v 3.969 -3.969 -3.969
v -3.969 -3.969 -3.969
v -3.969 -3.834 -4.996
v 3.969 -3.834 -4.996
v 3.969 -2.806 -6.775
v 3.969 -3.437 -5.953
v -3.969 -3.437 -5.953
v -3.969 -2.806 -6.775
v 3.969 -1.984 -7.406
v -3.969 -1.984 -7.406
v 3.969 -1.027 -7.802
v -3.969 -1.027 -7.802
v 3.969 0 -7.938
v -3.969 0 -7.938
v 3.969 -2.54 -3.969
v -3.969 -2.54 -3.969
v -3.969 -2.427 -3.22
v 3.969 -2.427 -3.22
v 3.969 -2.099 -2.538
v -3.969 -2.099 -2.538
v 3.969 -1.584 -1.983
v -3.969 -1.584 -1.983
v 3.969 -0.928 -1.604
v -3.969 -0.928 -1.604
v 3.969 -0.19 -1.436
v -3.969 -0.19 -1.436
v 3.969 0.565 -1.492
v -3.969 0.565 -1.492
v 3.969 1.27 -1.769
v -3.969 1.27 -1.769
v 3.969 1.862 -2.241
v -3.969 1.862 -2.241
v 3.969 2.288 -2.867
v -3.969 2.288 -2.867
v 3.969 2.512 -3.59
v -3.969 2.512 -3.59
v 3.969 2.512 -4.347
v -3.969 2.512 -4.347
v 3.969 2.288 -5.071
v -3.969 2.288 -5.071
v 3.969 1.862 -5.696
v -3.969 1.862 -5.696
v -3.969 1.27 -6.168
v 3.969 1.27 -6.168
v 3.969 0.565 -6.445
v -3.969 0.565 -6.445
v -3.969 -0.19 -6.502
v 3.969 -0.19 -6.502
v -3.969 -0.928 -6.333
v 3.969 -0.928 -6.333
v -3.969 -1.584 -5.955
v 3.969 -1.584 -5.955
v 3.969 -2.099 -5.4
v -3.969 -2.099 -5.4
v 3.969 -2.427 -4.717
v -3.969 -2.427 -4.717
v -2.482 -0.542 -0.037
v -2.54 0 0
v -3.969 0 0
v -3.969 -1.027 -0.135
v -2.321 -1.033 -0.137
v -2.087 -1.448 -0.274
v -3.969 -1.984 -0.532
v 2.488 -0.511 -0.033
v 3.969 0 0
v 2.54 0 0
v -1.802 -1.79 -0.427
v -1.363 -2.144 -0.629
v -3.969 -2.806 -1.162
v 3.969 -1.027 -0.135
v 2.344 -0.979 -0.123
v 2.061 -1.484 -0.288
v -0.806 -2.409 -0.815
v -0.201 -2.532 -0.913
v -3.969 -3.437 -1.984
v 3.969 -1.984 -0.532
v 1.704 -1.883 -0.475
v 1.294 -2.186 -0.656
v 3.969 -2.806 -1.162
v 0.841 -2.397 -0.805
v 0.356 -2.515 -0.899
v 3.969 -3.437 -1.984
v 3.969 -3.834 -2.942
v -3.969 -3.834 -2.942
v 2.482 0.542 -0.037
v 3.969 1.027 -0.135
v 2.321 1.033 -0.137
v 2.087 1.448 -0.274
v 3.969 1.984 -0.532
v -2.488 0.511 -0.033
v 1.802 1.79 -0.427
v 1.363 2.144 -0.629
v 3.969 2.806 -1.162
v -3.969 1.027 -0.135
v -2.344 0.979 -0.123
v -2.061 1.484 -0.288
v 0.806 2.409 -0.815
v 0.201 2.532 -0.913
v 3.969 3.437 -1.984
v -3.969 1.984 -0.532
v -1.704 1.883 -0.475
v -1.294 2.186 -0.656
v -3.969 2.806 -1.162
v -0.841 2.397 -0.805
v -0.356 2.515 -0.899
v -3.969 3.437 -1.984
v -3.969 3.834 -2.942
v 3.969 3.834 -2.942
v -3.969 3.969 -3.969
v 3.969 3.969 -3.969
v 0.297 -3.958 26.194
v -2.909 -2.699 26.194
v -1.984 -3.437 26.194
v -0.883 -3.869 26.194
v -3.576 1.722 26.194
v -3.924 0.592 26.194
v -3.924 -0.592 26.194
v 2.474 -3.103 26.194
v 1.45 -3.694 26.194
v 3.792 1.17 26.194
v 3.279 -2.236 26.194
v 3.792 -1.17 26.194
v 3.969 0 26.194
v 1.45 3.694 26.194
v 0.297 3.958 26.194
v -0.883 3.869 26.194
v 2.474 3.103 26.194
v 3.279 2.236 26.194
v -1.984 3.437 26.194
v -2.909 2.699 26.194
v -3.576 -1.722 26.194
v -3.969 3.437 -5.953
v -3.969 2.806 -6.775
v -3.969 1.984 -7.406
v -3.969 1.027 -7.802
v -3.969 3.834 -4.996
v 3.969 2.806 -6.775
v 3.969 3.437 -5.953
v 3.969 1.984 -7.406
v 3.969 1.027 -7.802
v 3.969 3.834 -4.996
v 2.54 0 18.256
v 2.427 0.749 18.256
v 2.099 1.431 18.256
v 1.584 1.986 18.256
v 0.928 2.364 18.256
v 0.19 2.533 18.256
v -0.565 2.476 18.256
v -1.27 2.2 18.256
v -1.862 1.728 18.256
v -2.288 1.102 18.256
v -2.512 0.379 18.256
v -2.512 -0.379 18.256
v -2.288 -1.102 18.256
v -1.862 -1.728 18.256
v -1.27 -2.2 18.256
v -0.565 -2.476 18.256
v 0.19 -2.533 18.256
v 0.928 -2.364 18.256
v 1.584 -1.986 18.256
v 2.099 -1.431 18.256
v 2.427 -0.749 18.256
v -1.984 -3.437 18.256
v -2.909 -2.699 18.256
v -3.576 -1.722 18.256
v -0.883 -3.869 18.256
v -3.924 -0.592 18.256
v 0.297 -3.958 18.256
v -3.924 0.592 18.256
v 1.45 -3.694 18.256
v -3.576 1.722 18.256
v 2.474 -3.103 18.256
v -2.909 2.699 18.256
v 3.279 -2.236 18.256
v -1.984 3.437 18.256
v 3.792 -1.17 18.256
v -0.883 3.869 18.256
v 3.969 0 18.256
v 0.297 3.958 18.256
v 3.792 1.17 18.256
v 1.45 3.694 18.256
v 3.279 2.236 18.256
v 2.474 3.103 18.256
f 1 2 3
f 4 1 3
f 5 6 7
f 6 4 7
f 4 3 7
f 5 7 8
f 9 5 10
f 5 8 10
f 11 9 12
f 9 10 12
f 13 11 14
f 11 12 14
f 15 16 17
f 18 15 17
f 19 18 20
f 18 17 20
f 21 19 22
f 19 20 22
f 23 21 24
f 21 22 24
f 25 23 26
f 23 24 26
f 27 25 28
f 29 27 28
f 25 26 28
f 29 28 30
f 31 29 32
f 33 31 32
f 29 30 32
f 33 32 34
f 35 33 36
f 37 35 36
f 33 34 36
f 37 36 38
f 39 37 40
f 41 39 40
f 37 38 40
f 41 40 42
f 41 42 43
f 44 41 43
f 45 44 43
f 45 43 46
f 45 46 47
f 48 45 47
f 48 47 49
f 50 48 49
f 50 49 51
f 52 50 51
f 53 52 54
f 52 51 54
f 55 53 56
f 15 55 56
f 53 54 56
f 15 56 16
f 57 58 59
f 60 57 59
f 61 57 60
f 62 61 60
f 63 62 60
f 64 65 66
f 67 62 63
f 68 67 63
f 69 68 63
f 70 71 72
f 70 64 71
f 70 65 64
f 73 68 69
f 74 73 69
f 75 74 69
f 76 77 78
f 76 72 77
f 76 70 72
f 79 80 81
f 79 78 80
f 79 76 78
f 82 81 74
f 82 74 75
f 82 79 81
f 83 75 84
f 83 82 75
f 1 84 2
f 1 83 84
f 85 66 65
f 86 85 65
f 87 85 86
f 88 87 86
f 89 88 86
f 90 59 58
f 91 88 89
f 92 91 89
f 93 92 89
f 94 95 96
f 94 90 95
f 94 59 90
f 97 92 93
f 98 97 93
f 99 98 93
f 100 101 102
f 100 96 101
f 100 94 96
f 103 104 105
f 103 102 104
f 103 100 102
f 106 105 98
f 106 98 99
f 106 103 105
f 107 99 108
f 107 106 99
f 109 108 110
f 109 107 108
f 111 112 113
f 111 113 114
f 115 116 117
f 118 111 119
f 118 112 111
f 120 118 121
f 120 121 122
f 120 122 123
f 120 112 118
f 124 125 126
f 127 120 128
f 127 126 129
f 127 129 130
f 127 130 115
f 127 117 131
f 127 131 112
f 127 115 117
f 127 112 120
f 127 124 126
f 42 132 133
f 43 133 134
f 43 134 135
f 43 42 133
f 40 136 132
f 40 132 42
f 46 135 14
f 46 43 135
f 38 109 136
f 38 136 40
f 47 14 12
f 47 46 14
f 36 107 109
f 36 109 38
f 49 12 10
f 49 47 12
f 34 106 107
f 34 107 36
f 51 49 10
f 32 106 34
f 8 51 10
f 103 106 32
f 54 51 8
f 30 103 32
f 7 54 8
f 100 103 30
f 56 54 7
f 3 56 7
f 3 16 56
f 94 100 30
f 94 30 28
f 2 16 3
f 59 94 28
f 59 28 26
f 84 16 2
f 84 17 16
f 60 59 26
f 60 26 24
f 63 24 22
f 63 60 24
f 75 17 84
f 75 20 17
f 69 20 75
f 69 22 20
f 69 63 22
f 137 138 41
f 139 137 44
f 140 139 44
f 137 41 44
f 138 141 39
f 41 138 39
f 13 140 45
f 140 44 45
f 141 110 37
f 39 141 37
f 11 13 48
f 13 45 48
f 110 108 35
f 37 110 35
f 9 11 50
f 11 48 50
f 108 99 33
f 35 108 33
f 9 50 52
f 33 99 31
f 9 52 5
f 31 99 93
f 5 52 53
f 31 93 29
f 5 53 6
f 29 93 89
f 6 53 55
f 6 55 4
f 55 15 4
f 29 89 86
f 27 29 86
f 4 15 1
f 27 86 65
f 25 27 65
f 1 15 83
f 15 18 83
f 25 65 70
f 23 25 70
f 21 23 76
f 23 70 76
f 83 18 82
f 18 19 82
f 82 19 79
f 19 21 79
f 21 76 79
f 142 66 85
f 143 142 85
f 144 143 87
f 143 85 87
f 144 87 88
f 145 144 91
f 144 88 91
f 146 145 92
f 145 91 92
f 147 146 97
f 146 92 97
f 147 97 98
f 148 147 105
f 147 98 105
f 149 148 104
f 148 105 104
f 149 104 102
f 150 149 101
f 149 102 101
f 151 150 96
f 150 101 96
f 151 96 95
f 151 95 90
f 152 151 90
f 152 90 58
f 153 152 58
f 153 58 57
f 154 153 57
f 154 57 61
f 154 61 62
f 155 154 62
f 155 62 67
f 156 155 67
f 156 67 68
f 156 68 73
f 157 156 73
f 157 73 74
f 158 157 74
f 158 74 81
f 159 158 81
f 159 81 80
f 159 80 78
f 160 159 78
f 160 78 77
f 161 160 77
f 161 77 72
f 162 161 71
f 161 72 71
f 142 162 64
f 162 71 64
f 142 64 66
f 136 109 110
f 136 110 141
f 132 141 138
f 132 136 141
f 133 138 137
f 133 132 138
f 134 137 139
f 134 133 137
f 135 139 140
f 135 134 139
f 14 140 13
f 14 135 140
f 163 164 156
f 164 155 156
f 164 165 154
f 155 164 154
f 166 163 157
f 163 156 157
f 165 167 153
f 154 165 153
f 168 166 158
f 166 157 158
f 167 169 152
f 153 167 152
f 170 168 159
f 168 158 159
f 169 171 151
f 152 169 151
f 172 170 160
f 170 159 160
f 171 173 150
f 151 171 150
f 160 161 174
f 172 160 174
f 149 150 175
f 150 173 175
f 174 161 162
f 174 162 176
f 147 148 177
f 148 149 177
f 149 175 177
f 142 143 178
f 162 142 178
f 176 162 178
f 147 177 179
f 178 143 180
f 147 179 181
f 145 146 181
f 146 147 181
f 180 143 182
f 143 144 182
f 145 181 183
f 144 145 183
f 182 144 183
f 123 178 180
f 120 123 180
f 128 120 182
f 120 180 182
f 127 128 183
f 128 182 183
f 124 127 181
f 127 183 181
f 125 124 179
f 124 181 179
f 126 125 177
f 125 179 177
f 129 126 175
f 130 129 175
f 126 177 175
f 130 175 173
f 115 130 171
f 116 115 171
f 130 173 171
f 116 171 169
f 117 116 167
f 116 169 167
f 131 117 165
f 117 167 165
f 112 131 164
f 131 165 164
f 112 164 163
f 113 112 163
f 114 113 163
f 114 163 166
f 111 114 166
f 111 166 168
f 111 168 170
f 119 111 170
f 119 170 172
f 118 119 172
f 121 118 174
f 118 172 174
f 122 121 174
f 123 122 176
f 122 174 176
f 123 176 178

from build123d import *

# Parameters (mm, degrees)
F0_R         = 2.54
F1_DEPTH     = 18.25625
F2_W         = 7.9375
F2_H         = 7.9375
F3_DEPTH     = 7.9375
F4_R         = 3.96875
F5_DEPTH     = 7.9375
F6_T1_DEPTH  = 27.78125
F6_T6_DEPTH  = 27.78125
F6_S7_R      = 2.54
F6_T8_DEPTH  = 16
F6_T12_DEPTH = 27.78125
F6_S13_R     = 2.54
F6_T14_DEPTH = 16
F7_R         = 2.54
F8_DEPTH     = 7.9375


# Not quite as in the source:
# - a fillet or chamfer that OpenCascade refuses, or shapes differently, is made with other operations: its cross-section is extruded or revolved along the edge and cut away or added


with BuildPart() as f1:
    # F0 (on Top) → F1 (new body)
    with BuildSketch(Plane.XY):
        Circle(F0_R)
    extrude(amount=F1_DEPTH)

    # F2 (on face) → F3 (join)
    with BuildSketch(Plane(origin=(0, 0, 0), x_dir=(1, 0, 0), z_dir=(0, 0, -1))):
        Rectangle(F2_W, F2_H)
    extrude(amount=F3_DEPTH)

    # F4 (on face) → F5 (join)
    with BuildSketch(Plane.XY.offset(18.25625)):
        Circle(F4_R)
    extrude(amount=F5_DEPTH)

    # F6: fillet of radius 3.96875 on 4 edges, made by hand

    # F6_s2 → F6_t1 (cut)
    with BuildSketch(Plane.YZ.offset(-13.890625)):
        with BuildLine():
            ThreePointArc((3.96875, -3.96875), (2.8063300378, -6.7750800378), (0, -7.9375))
            Line((0, -7.9375), (3.96875, -7.9375))
            Line((3.96875, -7.9375), (3.96875, -3.96875))
        make_face()
        with BuildLine():
            ThreePointArc((-3.96875, -3.96875), (-2.8063300378, -6.7750800378), (0, -7.9375))
            Line((0, -7.9375), (-3.96875, -7.9375))
            Line((-3.96875, -7.9375), (-3.96875, -3.96875))
        make_face()
    extrude(amount=F6_T1_DEPTH, mode=Mode.SUBTRACT)


with BuildPart() as f6_tool4:
    # F6_s5 → F6_t6 (new body)
    with BuildSketch(Plane.YZ.offset(13.890625)):
        with BuildLine():
            ThreePointArc((0, 0), (-2.8063300378, -1.1624199622), (-3.96875, -3.96875))
            Line((-3.96875, -3.96875), (-3.96875, 0))
            Line((-3.96875, 0), (0, 0))
        make_face()
    extrude(amount=-F6_T6_DEPTH)

    # F6_s7 → F6_t8 (cut, symmetric)
    with BuildSketch(Plane.XY.offset(-2)):
        Circle(F6_S7_R)
    extrude(amount=F6_T8_DEPTH, both=True, mode=Mode.SUBTRACT)


with BuildPart() as f1_1:
    add(f1.part)

    # F6_t3: cut F6_tool4
    add(f6_tool4.part, mode=Mode.SUBTRACT)


with BuildPart() as f6_tool10:
    # F6_s11 → F6_t12 (new body)
    with BuildSketch(Plane.YZ.offset(-13.890625)):
        with BuildLine():
            ThreePointArc((0, 0), (2.8063300378, -1.1624199622), (3.96875, -3.96875))
            Line((3.96875, -3.96875), (3.96875, 0))
            Line((3.96875, 0), (0, 0))
        make_face()
    extrude(amount=F6_T12_DEPTH)

    # F6_s13 → F6_t14 (cut, symmetric)
    with BuildSketch(Plane.XY.offset(-2)):
        Circle(F6_S13_R)
    extrude(amount=F6_T14_DEPTH, both=True, mode=Mode.SUBTRACT)


with BuildPart() as f1_2:
    add(f1_1.part)

    # F6_t9: cut F6_tool10
    add(f6_tool10.part, mode=Mode.SUBTRACT)

    # F7 (on face) → F8 (cut, through all)
    with BuildSketch(Plane(origin=(-3.96875, 0, 0), x_dir=(0, -1, 0), z_dir=(-1, 0, 0))):
        with Locations((0, -3.96875)):
            Circle(F7_R)
    extrude(amount=-F8_DEPTH, mode=Mode.SUBTRACT)


solid = f1_2.part
